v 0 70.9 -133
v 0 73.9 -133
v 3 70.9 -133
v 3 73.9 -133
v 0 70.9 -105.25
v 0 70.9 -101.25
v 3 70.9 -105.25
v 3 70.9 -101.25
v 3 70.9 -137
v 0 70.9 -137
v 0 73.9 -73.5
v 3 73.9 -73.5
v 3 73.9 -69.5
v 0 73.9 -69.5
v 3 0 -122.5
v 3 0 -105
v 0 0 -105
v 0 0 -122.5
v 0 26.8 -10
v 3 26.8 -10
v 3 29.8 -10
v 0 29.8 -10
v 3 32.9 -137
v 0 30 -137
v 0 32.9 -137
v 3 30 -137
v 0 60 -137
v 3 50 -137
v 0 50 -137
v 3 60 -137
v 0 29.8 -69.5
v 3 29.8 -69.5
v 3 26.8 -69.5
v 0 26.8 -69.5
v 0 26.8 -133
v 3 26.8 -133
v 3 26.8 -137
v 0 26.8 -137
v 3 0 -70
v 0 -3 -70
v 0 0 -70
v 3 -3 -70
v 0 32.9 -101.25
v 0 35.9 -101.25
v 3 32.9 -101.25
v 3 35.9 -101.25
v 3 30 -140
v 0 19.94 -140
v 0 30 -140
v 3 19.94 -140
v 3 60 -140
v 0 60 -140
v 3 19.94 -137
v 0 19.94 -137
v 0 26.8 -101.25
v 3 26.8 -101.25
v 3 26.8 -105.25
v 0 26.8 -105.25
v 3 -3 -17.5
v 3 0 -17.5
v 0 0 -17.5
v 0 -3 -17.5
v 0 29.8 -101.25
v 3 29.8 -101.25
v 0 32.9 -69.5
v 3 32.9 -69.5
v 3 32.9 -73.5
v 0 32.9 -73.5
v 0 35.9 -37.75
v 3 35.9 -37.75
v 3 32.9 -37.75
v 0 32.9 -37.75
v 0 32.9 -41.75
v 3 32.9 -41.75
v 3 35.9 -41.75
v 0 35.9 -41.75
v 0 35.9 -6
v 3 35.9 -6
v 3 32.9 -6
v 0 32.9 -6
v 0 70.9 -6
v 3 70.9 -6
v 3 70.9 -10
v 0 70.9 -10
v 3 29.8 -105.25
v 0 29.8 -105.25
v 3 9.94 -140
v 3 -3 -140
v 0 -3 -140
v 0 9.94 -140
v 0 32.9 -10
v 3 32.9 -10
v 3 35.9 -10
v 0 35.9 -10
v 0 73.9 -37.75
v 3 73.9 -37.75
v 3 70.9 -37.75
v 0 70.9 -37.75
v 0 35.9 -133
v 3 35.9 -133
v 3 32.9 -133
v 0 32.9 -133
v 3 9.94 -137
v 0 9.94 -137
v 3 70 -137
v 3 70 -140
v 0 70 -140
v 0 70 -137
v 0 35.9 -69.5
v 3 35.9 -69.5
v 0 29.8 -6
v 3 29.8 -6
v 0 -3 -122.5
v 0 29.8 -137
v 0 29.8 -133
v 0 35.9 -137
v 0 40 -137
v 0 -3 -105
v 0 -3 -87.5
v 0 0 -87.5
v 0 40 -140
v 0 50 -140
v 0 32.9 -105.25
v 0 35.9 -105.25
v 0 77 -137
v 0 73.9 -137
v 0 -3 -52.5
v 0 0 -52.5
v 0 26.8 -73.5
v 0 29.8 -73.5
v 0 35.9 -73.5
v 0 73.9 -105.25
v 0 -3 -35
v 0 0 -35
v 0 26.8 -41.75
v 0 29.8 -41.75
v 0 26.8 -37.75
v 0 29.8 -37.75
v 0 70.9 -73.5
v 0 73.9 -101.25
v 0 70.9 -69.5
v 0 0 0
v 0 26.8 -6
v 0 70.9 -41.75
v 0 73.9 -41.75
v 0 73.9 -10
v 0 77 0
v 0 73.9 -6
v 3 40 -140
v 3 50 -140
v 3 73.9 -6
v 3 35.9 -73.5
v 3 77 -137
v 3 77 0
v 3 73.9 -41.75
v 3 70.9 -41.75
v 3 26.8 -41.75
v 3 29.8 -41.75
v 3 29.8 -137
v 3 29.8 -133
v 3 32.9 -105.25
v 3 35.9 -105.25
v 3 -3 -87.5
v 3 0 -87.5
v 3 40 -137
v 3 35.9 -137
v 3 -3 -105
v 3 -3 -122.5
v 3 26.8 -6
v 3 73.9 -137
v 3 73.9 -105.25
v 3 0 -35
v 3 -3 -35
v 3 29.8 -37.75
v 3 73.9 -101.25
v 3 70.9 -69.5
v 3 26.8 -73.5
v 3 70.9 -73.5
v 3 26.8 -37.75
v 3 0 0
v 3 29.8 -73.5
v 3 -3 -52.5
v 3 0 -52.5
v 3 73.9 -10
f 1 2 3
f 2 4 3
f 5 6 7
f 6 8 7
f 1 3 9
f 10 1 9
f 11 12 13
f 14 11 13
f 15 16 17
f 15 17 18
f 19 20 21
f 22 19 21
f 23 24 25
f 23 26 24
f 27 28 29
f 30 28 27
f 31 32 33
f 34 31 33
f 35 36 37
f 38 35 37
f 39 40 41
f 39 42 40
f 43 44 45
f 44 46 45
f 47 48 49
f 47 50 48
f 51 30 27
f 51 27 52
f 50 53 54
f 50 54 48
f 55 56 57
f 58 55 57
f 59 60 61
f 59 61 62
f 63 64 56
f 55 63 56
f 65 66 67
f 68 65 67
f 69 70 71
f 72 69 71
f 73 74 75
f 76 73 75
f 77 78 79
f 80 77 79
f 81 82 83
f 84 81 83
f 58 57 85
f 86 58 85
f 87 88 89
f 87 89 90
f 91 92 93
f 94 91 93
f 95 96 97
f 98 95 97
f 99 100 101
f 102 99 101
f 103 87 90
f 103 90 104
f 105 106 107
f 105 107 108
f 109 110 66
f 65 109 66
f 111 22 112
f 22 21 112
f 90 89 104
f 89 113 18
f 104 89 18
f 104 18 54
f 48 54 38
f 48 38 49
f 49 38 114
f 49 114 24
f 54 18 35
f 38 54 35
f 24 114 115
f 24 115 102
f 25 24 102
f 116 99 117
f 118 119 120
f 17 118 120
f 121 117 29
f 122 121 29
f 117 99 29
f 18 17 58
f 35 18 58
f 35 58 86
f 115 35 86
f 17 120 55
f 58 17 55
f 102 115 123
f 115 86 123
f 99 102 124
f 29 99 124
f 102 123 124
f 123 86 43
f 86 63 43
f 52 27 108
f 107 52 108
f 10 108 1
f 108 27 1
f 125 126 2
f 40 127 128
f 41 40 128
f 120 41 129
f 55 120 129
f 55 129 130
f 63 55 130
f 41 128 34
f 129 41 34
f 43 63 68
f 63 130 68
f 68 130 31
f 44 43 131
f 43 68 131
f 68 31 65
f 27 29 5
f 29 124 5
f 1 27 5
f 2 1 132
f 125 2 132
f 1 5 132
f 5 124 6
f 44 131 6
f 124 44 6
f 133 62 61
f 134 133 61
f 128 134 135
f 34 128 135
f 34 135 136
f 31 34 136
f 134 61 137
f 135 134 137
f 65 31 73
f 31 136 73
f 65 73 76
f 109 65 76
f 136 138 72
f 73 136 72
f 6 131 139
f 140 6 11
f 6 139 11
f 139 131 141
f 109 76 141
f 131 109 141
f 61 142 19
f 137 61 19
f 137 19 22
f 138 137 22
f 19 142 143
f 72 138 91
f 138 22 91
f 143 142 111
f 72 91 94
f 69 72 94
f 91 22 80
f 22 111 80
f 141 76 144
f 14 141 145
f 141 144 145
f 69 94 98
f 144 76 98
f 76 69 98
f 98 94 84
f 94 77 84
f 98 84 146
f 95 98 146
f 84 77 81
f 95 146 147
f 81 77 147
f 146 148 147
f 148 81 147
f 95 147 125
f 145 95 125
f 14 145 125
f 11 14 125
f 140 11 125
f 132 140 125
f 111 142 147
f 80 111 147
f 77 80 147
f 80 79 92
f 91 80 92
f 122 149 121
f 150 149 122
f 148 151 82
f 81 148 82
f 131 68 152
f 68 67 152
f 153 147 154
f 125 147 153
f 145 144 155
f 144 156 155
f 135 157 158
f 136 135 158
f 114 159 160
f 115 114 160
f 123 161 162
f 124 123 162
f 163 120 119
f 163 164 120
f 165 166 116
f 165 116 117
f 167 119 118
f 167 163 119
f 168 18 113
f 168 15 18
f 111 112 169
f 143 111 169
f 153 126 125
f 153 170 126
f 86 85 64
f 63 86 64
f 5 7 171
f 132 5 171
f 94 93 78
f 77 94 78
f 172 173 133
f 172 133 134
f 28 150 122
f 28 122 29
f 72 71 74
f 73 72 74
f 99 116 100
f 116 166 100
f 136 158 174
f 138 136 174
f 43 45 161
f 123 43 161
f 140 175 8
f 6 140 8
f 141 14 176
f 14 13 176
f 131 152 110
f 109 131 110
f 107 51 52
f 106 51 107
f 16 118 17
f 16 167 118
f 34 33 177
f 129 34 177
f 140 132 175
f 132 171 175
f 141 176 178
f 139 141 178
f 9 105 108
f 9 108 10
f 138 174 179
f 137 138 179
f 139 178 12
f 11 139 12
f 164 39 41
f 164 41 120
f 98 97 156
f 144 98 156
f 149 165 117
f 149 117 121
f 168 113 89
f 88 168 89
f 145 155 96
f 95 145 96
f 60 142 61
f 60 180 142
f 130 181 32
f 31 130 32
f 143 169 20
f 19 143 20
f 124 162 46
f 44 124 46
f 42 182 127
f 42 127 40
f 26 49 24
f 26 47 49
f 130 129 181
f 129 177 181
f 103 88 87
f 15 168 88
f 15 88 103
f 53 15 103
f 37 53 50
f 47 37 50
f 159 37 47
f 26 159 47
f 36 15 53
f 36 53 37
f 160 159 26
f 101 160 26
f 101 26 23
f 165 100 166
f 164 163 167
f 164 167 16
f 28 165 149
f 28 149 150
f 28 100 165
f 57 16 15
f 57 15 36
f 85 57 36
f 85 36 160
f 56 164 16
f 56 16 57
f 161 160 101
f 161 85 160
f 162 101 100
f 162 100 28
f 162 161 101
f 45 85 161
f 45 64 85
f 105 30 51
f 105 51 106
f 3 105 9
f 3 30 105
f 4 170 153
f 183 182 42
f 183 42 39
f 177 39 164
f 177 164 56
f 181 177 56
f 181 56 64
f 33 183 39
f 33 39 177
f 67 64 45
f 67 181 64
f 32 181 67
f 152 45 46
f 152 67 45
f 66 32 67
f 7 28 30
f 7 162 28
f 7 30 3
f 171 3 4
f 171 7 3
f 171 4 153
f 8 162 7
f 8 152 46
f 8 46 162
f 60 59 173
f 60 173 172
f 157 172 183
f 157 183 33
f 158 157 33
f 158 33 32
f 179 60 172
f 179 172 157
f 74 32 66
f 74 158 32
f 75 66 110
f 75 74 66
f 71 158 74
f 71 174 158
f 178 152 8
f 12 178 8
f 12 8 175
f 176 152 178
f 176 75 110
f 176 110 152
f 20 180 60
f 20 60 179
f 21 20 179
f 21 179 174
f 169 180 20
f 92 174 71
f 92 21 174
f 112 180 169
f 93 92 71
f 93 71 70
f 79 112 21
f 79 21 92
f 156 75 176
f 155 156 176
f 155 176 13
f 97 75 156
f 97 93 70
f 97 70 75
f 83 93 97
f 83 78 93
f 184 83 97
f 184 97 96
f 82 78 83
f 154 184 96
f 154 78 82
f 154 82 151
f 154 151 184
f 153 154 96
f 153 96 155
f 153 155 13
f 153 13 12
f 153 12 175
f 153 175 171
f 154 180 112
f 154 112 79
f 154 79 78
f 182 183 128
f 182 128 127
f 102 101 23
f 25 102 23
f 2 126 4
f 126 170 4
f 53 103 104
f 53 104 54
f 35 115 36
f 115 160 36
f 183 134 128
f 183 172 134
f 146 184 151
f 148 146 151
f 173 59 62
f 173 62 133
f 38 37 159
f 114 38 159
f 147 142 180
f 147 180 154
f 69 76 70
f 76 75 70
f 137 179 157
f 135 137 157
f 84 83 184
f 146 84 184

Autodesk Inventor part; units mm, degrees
ref_plane "YZ Plane" through (0, 0, 0) normal (1, 0, 0) x (0, 1, 0)
ref_plane "XZ Plane" through (0, 0, 0) normal (0, 1, 0) x (-1, 0, 0)
ref_plane "XY Plane" through (0, 0, 0) normal (0, 0, 1) x (1, 0, 0)
sketch "Sketch1" plane through (0, 0, 0) normal (1, 0, 0) x (0, 1, 0)
  line L0 (0, 0) -> (77, 0)
  line L1 (77, 0) -> (77, -140)
  line L2 (77, -140) -> (0, -140)
  line L3 (0, 0) -> (-3, 0)
  line L4 (-3, 0) -> (-3, -140)
  line L5 (-3, -140) -> (0, -140)
  dimension "d1" = 140
extrude "Extrusion1" add sketch "Sketch1" along normal blind 3
sketch "Sketch5" plane through (3, 0, 0) normal (1, 0, 0) x (0, 0, -1)
  line L0 (6, 73.9) -> (6, 70.9)
  line L1 (6, 70.9) -> (10, 70.9)
  line L2 (10, 70.9) -> (10, 73.9)
  line L3 (10, 73.9) -> (6, 73.9)
  line L4 (0, 77) -> (0, 0) projected
  line L5 (140, 77) -> (0, 77) projected
  line L6 (37.75, 73.9) -> (37.75, 70.9)
  line L7 (37.75, 70.9) -> (41.75, 70.9)
  line L8 (41.75, 70.9) -> (41.75, 73.9)
  line L9 (41.75, 73.9) -> (37.75, 73.9)
  line L10 (6, 35.9) -> (6, 32.9)
  line L11 (6, 32.9) -> (10, 32.9)
  line L12 (10, 32.9) -> (10, 35.9)
  line L13 (10, 35.9) -> (6, 35.9)
  line L14 (37.75, 35.9) -> (37.75, 32.9)
  line L15 (37.75, 32.9) -> (41.75, 32.9)
  line L16 (41.75, 32.9) -> (41.75, 35.9)
  line L17 (41.75, 35.9) -> (37.75, 35.9)
  line L18 (69.5, 73.9) -> (69.5, 70.9)
  line L19 (69.5, 70.9) -> (73.5, 70.9)
  line L20 (73.5, 70.9) -> (73.5, 73.9)
  line L21 (73.5, 73.9) -> (69.5, 73.9)
  line L22 (69.5, 35.9) -> (69.5, 32.9)
  line L23 (69.5, 32.9) -> (73.5, 32.9)
  line L24 (73.5, 32.9) -> (73.5, 35.9)
  line L25 (73.5, 35.9) -> (69.5, 35.9)
  line L26 (101.25, 73.9) -> (101.25, 70.9)
  line L27 (101.25, 70.9) -> (105.25, 70.9)
  line L28 (105.25, 70.9) -> (105.25, 73.9)
  line L29 (105.25, 73.9) -> (101.25, 73.9)
  line L30 (101.25, 35.9) -> (101.25, 32.9)
  line L31 (101.25, 32.9) -> (105.25, 32.9)
  line L32 (105.25, 32.9) -> (105.25, 35.9)
  line L33 (105.25, 35.9) -> (101.25, 35.9)
  line L34 (133, 73.9) -> (133, 70.9)
  line L35 (133, 70.9) -> (137, 70.9)
  line L36 (137, 70.9) -> (137, 73.9)
  line L37 (137, 73.9) -> (133, 73.9)
  line L38 (133, 35.9) -> (133, 32.9)
  line L39 (133, 32.9) -> (137, 32.9)
  line L40 (137, 32.9) -> (137, 35.9)
  line L41 (137, 35.9) -> (133, 35.9)
  line L42 (10, 26.8) -> (10, 29.8)
  line L43 (10, 29.8) -> (6, 29.8)
  line L44 (6, 26.8) -> (10, 26.8)
  line L45 (6, 29.8) -> (6, 26.8)
  line L46 (69.5, 29.8) -> (69.5, 26.8)
  line L47 (69.5, 26.8) -> (73.5, 26.8)
  line L48 (73.5, 29.8) -> (69.5, 29.8)
  line L49 (73.5, 26.8) -> (73.5, 29.8)
  line L50 (41.75, 29.8) -> (37.75, 29.8)
  line L51 (37.75, 26.8) -> (41.75, 26.8)
  line L52 (41.75, 26.8) -> (41.75, 29.8)
  line L53 (37.75, 29.8) -> (37.75, 26.8)
  line L54 (133, 29.8) -> (133, 26.8)
  line L55 (137, 29.8) -> (133, 29.8)
  line L56 (133, 26.8) -> (137, 26.8)
  line L57 (137, 26.8) -> (137, 29.8)
  line L58 (101.25, 29.8) -> (101.25, 26.8)
  line L59 (101.25, 26.8) -> (105.25, 26.8)
  line L60 (105.25, 26.8) -> (105.25, 29.8)
  line L61 (105.25, 29.8) -> (101.25, 29.8)
  line L62 (140, -3) -> (140, 77) projected
  dimension "d67" = 3
  dimension "d68" = 4
  dimension "d93" = 3.1
  dimension "d97" = 6
  dimension "d100" = 31.75
  dimension "d103" = 38
  dimension "d108" = 6.1
  dimension "d113" = 3
extrude "Extrusion5" cut sketch "Sketch5" against normal blind 10
sketch "Sketch6" plane through (3, 0, 0) normal (1, 0, 0) x (0, 0, -1)
  line L0 (0, 0) -> (17.5, 0)
  line L1 (17.5, 0) -> (17.5, -3)
  line L2 (17.5, -3) -> (35, -3)
  line L3 (35, -3) -> (35, 0)
  line L4 (0, 0) -> (0, 10)
  line L5 (140, 0) -> (140, 9.94)
  line L6 (137, 9.94) -> (137, 19.94)
  line L7 (137, 19.94) -> (140, 19.94)
  line L8 (140, 30) -> (137, 30)
  line L9 (137, 30) -> (137, 40)
  line L10 (137, 40) -> (140, 40)
  line L11 (140, 40) -> (140, 50)
  line L12 (140, 50) -> (137, 50)
  line L13 (137, 50) -> (137, 60)
  line L14 (137, 60) -> (140, 60)
  line L15 (140, 60) -> (140, 70)
  line L16 (140, 70) -> (137, 70)
  line L17 (137, 70) -> (137, 77)
  line L18 (140, 9.94) -> (137, 9.94)
  line L19 (140, 19.94) -> (140, 30)
  line L20 (3, 77) -> (137, 77)
  line L21 (0, 77) -> (0, 0)
  line L22 (0, 0) -> (0, 77)
  line L23 (0, 77) -> (3, 77)
  line L24 (35, 0) -> (52.5, 0)
  line L25 (52.5, 0) -> (52.5, -3)
  line L26 (52.5, -3) -> (70, -3)
  line L27 (70, -3) -> (70, 0)
  line L28 (70, 0) -> (87.5, 0)
  line L29 (87.5, 0) -> (87.5, -3)
  line L30 (87.5, -3) -> (105, -3)
  line L31 (105, -3) -> (105, 0)
  line L32 (105, 0) -> (122.5, 0)
  line L33 (122.5, 0) -> (122.5, -3)
  line L34 (122.5, -3) -> (140, -3)
  line L35 (140, 30) -> (140, 19.94)
  line L36 (140, 9.94) -> (140, -3)
  line L37 (140, 40) -> (140, 50)
  line L38 (140, 60) -> (140, 70)
  line L39 (140, -3) -> (140, 9.94)
  line L40 (137, 9.94) -> (137, 19.94)
  line L41 (0, 0) -> (0, 77)
  line L42 (137, 77) -> (0, 77)
  line L43 (0, 77) -> (0, 10)
  point P0 (0, 70)
extrude "Extrusion6" cut sketch "Sketch6" against normal blind 3 keep common part
properties part number "DoosjeRechterkant" material "Wood (Cherry)"
